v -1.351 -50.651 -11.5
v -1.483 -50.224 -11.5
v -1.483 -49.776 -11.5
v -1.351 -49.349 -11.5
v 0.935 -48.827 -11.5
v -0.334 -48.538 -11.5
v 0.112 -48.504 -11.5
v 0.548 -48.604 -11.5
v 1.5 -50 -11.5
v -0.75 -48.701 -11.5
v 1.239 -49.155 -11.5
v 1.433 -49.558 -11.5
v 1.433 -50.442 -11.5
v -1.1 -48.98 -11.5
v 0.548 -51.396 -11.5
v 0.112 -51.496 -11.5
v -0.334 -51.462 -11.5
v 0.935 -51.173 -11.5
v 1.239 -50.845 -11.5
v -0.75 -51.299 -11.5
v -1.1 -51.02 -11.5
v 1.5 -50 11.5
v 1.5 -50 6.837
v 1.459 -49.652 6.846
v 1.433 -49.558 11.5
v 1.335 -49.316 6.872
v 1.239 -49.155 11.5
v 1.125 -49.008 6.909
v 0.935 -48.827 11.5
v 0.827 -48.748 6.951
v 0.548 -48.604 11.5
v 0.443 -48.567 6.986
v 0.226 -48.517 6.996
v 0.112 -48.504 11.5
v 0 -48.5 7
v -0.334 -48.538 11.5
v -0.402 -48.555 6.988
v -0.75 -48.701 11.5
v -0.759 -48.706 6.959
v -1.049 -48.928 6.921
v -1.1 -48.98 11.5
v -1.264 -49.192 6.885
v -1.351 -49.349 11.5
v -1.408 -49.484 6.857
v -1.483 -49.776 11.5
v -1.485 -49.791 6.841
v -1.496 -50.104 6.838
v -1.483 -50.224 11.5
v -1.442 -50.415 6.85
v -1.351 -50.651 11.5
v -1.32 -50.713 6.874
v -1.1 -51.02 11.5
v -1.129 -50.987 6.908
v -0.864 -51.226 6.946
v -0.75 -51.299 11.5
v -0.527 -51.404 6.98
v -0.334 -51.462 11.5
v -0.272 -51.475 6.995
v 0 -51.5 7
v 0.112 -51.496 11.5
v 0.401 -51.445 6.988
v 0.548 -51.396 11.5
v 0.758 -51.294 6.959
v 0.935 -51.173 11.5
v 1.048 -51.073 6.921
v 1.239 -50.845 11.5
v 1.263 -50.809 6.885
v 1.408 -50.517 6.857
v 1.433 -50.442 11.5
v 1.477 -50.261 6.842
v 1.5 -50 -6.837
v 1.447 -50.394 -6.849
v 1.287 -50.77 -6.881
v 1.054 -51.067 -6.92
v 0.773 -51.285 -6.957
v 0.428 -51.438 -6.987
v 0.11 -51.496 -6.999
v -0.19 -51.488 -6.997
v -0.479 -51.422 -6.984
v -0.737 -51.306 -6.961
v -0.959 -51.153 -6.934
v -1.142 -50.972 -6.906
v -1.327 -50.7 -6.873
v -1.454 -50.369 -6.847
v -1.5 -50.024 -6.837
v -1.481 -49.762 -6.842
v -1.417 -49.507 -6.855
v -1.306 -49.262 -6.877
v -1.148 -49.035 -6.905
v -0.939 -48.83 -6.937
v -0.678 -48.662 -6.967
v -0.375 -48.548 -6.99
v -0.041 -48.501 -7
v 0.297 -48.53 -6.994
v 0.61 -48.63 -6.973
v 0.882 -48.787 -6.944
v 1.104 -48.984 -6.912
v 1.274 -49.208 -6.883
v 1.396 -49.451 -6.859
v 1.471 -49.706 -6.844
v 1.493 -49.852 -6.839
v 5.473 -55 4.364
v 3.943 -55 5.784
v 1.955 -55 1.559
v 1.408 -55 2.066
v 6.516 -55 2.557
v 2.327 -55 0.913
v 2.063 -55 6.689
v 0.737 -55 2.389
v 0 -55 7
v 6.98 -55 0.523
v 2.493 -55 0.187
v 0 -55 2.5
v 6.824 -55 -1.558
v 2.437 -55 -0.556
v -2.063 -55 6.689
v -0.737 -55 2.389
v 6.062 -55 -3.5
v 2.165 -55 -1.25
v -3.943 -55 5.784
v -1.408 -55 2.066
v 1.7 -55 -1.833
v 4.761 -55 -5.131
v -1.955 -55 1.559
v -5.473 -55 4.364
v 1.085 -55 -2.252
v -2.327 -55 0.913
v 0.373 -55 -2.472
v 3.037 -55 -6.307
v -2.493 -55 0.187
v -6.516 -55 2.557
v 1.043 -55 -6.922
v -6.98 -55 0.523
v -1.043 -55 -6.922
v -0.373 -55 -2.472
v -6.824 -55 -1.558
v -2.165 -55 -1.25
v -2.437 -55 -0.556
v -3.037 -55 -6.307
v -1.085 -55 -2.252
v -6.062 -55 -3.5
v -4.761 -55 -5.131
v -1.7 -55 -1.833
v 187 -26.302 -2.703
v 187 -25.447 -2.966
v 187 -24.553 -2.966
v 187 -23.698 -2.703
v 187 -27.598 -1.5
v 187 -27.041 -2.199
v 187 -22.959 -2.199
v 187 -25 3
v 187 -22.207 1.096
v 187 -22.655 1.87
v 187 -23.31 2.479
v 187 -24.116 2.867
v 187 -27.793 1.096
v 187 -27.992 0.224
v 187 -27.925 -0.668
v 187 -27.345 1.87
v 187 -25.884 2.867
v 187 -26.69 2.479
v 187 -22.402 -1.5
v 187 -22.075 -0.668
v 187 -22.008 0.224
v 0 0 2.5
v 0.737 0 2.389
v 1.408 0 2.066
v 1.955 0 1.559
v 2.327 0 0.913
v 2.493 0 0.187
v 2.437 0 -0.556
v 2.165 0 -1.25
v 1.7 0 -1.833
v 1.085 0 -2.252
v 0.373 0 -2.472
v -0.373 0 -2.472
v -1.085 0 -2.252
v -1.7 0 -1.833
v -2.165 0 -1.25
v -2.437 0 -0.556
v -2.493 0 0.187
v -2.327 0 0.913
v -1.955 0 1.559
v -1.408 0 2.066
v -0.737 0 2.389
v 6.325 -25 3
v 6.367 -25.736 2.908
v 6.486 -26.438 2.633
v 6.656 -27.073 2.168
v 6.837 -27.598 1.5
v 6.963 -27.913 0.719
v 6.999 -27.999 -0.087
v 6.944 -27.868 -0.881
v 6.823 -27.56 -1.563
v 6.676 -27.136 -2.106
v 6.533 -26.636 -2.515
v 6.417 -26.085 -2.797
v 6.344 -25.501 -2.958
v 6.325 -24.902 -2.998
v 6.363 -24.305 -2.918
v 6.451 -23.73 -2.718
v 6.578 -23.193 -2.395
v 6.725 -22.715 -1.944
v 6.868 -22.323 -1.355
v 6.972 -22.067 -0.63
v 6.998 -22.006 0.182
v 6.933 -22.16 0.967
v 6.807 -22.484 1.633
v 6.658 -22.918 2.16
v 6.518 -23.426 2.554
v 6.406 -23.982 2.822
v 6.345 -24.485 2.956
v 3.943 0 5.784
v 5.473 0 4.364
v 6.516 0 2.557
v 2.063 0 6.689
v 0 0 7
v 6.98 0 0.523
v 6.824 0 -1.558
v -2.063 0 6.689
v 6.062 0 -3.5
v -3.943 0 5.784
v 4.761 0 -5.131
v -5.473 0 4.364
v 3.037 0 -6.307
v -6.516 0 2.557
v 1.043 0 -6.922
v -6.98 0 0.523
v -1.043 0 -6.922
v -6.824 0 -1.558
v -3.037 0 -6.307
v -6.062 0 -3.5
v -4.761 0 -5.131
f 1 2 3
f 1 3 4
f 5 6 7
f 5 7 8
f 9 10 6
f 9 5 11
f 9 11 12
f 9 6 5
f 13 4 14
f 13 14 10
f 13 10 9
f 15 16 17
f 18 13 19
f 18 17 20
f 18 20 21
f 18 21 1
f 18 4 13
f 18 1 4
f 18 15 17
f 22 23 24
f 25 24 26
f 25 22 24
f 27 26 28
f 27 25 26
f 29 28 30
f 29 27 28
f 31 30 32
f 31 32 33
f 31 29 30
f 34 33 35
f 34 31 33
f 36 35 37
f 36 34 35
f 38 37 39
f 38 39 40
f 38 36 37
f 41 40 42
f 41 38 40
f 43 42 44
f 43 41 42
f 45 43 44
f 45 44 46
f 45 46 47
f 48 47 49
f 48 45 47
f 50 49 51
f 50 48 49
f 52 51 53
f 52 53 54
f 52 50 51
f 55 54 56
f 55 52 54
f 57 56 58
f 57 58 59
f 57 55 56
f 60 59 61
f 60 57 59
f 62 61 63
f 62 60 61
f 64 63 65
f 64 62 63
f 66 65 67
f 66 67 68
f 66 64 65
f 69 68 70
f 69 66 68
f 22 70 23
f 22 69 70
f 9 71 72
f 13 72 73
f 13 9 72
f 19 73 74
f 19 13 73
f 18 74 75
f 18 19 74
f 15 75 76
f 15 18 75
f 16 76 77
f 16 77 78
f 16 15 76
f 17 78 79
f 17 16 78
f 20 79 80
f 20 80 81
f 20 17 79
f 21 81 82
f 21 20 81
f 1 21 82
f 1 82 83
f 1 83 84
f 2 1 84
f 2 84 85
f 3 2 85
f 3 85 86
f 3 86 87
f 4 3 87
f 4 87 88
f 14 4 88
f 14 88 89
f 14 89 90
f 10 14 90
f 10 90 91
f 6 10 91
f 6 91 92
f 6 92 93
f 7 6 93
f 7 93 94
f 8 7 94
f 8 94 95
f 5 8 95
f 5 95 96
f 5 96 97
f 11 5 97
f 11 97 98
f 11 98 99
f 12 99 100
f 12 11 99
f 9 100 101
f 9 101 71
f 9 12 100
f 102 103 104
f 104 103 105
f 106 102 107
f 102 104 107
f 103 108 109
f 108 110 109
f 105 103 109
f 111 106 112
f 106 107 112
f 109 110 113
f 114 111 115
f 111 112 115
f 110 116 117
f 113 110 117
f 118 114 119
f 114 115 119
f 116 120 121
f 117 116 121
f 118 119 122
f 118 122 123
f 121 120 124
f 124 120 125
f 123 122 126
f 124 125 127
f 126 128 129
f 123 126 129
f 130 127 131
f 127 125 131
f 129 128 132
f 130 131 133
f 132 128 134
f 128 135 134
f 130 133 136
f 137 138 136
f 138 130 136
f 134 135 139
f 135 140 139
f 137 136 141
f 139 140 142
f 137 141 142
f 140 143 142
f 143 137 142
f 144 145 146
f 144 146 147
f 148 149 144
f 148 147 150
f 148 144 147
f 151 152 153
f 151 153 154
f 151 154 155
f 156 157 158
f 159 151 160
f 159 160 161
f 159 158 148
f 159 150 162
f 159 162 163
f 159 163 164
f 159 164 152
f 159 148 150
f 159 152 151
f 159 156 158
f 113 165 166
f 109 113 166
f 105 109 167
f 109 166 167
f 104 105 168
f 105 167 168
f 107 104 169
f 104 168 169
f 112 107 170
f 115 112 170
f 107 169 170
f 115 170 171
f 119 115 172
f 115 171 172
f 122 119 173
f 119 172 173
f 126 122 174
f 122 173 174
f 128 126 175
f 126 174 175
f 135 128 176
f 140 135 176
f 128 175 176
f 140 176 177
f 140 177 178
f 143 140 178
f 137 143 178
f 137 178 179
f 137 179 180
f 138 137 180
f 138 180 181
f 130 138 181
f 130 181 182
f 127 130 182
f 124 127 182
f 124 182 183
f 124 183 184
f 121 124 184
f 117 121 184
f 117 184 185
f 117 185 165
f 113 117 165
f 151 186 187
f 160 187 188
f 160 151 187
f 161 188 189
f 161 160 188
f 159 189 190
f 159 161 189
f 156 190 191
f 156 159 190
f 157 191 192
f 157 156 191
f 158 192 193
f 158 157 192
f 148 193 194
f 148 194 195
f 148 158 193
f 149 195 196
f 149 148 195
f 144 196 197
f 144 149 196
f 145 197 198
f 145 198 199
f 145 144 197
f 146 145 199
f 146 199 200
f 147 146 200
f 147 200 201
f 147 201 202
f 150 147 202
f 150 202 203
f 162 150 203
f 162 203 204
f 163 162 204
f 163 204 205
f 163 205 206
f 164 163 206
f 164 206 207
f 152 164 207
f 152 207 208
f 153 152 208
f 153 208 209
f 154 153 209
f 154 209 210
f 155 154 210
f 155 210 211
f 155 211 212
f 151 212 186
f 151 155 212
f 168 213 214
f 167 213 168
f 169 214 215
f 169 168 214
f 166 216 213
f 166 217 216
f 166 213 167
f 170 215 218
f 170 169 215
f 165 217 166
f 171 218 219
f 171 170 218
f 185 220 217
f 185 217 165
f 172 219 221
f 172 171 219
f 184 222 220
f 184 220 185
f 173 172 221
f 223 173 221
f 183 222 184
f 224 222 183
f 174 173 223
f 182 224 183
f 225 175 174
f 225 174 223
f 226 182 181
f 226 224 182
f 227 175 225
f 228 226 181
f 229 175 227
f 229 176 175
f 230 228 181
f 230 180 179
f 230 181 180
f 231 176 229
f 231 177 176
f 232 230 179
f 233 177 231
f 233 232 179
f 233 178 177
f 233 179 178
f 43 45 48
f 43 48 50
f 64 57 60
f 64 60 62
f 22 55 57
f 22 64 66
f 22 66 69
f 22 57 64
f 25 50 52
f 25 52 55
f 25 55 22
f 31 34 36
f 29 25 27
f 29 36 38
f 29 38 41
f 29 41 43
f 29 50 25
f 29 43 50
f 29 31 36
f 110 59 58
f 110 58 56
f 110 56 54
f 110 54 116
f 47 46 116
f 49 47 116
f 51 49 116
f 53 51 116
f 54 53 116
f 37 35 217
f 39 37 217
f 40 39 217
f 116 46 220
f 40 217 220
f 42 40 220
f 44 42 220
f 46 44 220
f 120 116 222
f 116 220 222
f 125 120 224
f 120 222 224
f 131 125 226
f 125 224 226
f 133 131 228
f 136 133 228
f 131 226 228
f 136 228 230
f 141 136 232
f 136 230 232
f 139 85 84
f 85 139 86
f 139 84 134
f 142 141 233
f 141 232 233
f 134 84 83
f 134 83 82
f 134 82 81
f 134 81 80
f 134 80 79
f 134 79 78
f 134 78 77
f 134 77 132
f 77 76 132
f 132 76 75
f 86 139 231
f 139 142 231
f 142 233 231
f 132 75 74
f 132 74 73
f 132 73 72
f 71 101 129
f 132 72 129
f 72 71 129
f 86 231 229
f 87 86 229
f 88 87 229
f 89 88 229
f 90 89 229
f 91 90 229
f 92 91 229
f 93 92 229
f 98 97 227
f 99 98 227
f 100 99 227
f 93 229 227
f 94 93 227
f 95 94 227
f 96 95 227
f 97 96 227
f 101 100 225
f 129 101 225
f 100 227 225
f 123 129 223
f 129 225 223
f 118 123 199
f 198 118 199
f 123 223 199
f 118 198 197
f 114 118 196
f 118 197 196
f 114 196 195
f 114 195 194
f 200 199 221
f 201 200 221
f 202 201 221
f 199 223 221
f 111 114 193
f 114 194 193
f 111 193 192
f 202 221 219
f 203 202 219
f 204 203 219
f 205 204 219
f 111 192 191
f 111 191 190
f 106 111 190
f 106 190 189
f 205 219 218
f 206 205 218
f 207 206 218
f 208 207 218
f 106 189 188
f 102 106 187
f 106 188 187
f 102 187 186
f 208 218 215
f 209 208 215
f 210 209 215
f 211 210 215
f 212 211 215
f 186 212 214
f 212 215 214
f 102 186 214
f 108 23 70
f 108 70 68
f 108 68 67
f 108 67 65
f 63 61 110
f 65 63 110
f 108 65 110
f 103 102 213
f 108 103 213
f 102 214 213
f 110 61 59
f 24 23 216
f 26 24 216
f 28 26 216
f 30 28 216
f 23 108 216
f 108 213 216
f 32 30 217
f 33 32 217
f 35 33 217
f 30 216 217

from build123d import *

# Parameters (mm, degrees)
ESQUISSE1_W             = 7
ESQUISSE1_H             = 55
ESQUISSE2_W             = 70
ESQUISSE2_H             = 3
ESQUISSE3_W             = 2
ESQUISSE3_H             = 1.5
ESQUISSE5_R             = 2.5
ENL_V_MAT_EXTRU_1_DEPTH = 96.052617065
ESQUISSE8_R             = 1.5
BOSS_EXTRU_1_DEPTH      = 2.5
BOSS_EXTRU_1_DEPTH_BACK = 3
ESQUISSE11_R            = 1.5
BOSS_EXTRU_2_DEPTH      = 2.5
BOSS_EXTRU_2_DEPTH_BACK = 3
ESQUISSE12_R            = 3
BOSS_EXTRU_3_DEPTH      = 110
BOSS_EXTRU_3_DEPTH_BACK = 71.5


with BuildPart() as part:
    # Esquisse1 → Révolution1 (revolve)
    with BuildSketch(Plane.XY, mode=Mode.PRIVATE) as r_volution1_sk:
        with Locations((3.5, -27.5)):
            Rectangle(ESQUISSE1_W, ESQUISSE1_H)
    revolve(r_volution1_sk.sketch.rotate(Axis((0, 0, 0), (0, -1, 0)), 90), axis=Axis((0, 0, 0), (0, -1, 0)))

    # Esquisse4 → Révolution5 (revolve)
    with BuildSketch(Plane(origin=(0, 0, 0), x_dir=(0, 0, -1), z_dir=(1, 0, 0)), mode=Mode.PRIVATE) as r_volution5_sk:
        Polygon((6.966968242, -50), (7, -48.5), (9, -48.5), (9, -50), align=None)
    revolve(r_volution5_sk.sketch.rotate(Axis((0, -50, 17.973106255), (0, 0, -1)), 90), axis=Axis((0, -50, 17.973106255), (0, 0, -1)))

    # Esquisse5 → Enlèv. mat.-Extru.1 (cut, through all)
    with BuildSketch(Plane(origin=(0, 0, 0), x_dir=(1, 0, 0), z_dir=(0, 1, 0))):
        with Locations(Location((0, 0, 0), (0, 0, 270))):
            Circle(ESQUISSE5_R)
    extrude(amount=-ENL_V_MAT_EXTRU_1_DEPTH, mode=Mode.SUBTRACT)



with BuildPart() as body_2:
    # Esquisse2 → Révolution2 (revolve)
    with BuildSketch(Plane.XY, mode=Mode.PRIVATE) as r_volution2_sk:
        with Locations((42, -23.5)):
            Rectangle(ESQUISSE2_W, ESQUISSE2_H)
    revolve(r_volution2_sk.sketch.rotate(Axis((-18.358665949, -25, 0), (1, 0, 0)), 90), axis=Axis((-18.358665949, -25, 0), (1, 0, 0)))


with BuildPart() as body_3:
    # Esquisse3 → Révolution4 (revolve)
    with BuildSketch(Plane(origin=(0, 0, 0), x_dir=(0, 0, -1), z_dir=(1, 0, 0)), mode=Mode.PRIVATE) as r_volution4_sk:
        with Locations((-8, -49.25)):
            Rectangle(ESQUISSE3_W, ESQUISSE3_H)
    revolve(r_volution4_sk.sketch.rotate(Axis((0, -50, 15.119555316), (0, 0, -1)), 90), axis=Axis((0, -50, 15.119555316), (0, 0, -1)))


with BuildPart() as part_1:
    add(part.part)

    add(body_3.part)  # Boss.-Extru.1 merges body 3
    # Esquisse8 → Boss.-Extru.1 (add, two sides)
    with BuildSketch(Plane.XY.offset(9)) as boss_extru_1_sk:
        with Locations((0, -50)):
            Circle(ESQUISSE8_R)
    extrude(amount=BOSS_EXTRU_1_DEPTH)
    extrude(boss_extru_1_sk.sketch, amount=-BOSS_EXTRU_1_DEPTH_BACK)

    # Esquisse11 → Boss.-Extru.2 (add, two sides)
    with BuildSketch(Plane(origin=(0, 0, -9), x_dir=(-1, 0, 0), z_dir=(0, 0, -1))) as boss_extru_2_sk:
        with Locations(Location((0, -50, 0), (0, 0, 180))):
            Circle(ESQUISSE11_R)
    extrude(amount=BOSS_EXTRU_2_DEPTH)
    extrude(boss_extru_2_sk.sketch, amount=-BOSS_EXTRU_2_DEPTH_BACK)


    add(body_2.part)  # Boss.-Extru.3 merges body 2
    # Esquisse12 → Boss.-Extru.3 (add, two sides)
    with BuildSketch(Plane(origin=(77, 0, 0), x_dir=(0, 0, -1), z_dir=(1, 0, 0))) as boss_extru_3_sk:
        with Locations(Location((0, -25, 0), (0, 0, 180))):
            Circle(ESQUISSE12_R)
    extrude(amount=BOSS_EXTRU_3_DEPTH)
    extrude(boss_extru_3_sk.sketch, amount=-BOSS_EXTRU_3_DEPTH_BACK)


solid = part_1.part
